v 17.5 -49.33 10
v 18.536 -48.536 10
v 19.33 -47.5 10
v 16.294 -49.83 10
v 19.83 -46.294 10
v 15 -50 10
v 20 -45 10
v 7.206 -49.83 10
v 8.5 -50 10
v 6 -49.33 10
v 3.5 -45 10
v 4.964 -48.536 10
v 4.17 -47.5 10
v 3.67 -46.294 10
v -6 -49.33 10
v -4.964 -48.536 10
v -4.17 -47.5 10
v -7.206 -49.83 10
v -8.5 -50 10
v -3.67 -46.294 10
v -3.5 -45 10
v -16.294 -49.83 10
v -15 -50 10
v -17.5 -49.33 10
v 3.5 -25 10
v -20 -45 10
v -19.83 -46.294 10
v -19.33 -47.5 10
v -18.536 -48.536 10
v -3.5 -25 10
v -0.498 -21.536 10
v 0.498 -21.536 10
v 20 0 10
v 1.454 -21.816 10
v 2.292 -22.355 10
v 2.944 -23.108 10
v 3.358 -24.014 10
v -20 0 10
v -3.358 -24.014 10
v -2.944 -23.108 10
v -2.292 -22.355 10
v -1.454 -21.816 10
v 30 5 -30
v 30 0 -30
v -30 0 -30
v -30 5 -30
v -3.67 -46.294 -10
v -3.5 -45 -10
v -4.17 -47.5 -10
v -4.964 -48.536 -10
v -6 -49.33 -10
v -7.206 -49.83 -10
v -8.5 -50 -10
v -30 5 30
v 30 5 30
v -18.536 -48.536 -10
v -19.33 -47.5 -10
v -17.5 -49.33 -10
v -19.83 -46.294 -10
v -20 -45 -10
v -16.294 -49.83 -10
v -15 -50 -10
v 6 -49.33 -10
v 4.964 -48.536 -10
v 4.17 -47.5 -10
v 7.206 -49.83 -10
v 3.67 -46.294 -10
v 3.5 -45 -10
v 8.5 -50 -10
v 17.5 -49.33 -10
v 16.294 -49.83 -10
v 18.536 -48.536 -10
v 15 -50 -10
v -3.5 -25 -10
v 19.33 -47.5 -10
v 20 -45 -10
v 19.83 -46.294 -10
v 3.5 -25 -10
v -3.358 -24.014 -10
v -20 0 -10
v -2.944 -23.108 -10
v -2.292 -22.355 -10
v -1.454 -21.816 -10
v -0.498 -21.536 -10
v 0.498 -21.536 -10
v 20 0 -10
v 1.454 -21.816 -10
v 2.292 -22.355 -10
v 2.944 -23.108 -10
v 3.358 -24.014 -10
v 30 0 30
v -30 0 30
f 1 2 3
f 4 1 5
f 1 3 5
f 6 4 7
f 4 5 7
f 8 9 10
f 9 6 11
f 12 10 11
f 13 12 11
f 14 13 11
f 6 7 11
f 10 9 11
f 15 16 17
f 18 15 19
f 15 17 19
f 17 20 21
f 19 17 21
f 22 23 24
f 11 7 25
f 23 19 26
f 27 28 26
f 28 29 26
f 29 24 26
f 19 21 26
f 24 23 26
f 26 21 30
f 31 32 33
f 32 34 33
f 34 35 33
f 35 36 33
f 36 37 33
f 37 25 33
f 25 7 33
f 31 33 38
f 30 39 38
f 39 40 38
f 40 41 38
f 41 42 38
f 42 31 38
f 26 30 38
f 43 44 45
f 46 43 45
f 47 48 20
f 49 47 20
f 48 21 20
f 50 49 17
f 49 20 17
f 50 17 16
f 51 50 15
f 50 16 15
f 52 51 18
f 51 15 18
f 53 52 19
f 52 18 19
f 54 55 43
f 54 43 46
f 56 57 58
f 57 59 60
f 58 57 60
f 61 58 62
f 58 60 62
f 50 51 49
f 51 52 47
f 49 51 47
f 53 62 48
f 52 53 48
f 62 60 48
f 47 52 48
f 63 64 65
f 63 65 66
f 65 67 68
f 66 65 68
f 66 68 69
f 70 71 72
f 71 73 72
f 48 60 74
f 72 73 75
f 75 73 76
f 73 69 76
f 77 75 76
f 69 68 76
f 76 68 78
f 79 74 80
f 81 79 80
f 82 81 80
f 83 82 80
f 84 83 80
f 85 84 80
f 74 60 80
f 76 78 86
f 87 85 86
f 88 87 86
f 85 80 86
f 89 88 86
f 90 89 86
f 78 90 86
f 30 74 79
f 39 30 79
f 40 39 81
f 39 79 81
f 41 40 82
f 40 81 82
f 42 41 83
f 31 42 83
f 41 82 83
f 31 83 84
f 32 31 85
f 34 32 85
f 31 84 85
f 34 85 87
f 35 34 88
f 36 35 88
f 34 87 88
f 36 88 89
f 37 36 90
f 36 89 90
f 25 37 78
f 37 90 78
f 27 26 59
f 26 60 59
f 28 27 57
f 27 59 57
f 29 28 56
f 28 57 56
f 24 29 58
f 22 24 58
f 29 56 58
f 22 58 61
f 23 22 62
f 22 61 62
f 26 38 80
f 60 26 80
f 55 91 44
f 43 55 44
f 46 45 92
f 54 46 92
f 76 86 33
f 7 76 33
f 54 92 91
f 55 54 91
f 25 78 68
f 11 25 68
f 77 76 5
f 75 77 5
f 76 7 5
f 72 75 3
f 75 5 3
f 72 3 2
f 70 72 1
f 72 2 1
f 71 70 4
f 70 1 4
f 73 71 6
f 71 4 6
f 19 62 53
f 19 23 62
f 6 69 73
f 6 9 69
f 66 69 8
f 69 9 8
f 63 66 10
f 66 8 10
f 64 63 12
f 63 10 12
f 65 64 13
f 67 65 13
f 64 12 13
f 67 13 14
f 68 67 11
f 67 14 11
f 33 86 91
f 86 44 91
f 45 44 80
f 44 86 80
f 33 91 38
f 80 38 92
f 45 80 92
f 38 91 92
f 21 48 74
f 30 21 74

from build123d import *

# Parameters (mm, degrees)
F1_DEPTH = 50
F3_DEPTH = 25
F5_DEPTH = 5
F6_R     = 5


with BuildPart() as f1:
    # F0 (on Front) → F1 (new body)
    with BuildSketch(Plane.XZ):
        Polygon((20, 10), (0, 10), (-20, 10), (-20, -10), (20, -10), align=None)
    extrude(amount=F1_DEPTH)

    # F2 (on face) → F3 (cut)
    with BuildSketch(Plane(origin=(0, 0, -10), x_dir=(1, 0, 0), z_dir=(0, 0, -1))):
        with BuildLine():
            Line((-3.5, 50), (-3.5, 25))
            ThreePointArc((-3.5, 25), (0, 21.5), (3.5, 25))
            Line((3.5, 25), (3.5, 50))
            Line((3.5, 50), (-3.5, 50))
        make_face()
    extrude(amount=-F3_DEPTH, mode=Mode.SUBTRACT)

    # F4 (on face) → F5 (join)
    with BuildSketch(Plane(origin=(0, 0, 0), x_dir=(-1, 0, 0), z_dir=(0, 1, 0))):
        Polygon((-30, 30), (-30, 0), (-30, -30), (30, -30), (30, 30), align=None)
        Polygon((-20, -10), (-20, 0), (-20, 10), (20, 10), (20, -10), align=None, mode=Mode.SUBTRACT)
        Polygon((-20, 10), (-20, 0), (-20, -10), (20, -10), (20, 10), align=None)
    extrude(amount=F5_DEPTH)

    # F6
    f6_edges = [f1.edges().sort_by_distance(p)[0] for p in [
        (20, -50, 0),
        (3.5, -50, 0),
        (-3.5, -50, 0),
        (-20, -50, 0),
    ]]
    fillet(f6_edges, radius=F6_R)


solid = f1.part
